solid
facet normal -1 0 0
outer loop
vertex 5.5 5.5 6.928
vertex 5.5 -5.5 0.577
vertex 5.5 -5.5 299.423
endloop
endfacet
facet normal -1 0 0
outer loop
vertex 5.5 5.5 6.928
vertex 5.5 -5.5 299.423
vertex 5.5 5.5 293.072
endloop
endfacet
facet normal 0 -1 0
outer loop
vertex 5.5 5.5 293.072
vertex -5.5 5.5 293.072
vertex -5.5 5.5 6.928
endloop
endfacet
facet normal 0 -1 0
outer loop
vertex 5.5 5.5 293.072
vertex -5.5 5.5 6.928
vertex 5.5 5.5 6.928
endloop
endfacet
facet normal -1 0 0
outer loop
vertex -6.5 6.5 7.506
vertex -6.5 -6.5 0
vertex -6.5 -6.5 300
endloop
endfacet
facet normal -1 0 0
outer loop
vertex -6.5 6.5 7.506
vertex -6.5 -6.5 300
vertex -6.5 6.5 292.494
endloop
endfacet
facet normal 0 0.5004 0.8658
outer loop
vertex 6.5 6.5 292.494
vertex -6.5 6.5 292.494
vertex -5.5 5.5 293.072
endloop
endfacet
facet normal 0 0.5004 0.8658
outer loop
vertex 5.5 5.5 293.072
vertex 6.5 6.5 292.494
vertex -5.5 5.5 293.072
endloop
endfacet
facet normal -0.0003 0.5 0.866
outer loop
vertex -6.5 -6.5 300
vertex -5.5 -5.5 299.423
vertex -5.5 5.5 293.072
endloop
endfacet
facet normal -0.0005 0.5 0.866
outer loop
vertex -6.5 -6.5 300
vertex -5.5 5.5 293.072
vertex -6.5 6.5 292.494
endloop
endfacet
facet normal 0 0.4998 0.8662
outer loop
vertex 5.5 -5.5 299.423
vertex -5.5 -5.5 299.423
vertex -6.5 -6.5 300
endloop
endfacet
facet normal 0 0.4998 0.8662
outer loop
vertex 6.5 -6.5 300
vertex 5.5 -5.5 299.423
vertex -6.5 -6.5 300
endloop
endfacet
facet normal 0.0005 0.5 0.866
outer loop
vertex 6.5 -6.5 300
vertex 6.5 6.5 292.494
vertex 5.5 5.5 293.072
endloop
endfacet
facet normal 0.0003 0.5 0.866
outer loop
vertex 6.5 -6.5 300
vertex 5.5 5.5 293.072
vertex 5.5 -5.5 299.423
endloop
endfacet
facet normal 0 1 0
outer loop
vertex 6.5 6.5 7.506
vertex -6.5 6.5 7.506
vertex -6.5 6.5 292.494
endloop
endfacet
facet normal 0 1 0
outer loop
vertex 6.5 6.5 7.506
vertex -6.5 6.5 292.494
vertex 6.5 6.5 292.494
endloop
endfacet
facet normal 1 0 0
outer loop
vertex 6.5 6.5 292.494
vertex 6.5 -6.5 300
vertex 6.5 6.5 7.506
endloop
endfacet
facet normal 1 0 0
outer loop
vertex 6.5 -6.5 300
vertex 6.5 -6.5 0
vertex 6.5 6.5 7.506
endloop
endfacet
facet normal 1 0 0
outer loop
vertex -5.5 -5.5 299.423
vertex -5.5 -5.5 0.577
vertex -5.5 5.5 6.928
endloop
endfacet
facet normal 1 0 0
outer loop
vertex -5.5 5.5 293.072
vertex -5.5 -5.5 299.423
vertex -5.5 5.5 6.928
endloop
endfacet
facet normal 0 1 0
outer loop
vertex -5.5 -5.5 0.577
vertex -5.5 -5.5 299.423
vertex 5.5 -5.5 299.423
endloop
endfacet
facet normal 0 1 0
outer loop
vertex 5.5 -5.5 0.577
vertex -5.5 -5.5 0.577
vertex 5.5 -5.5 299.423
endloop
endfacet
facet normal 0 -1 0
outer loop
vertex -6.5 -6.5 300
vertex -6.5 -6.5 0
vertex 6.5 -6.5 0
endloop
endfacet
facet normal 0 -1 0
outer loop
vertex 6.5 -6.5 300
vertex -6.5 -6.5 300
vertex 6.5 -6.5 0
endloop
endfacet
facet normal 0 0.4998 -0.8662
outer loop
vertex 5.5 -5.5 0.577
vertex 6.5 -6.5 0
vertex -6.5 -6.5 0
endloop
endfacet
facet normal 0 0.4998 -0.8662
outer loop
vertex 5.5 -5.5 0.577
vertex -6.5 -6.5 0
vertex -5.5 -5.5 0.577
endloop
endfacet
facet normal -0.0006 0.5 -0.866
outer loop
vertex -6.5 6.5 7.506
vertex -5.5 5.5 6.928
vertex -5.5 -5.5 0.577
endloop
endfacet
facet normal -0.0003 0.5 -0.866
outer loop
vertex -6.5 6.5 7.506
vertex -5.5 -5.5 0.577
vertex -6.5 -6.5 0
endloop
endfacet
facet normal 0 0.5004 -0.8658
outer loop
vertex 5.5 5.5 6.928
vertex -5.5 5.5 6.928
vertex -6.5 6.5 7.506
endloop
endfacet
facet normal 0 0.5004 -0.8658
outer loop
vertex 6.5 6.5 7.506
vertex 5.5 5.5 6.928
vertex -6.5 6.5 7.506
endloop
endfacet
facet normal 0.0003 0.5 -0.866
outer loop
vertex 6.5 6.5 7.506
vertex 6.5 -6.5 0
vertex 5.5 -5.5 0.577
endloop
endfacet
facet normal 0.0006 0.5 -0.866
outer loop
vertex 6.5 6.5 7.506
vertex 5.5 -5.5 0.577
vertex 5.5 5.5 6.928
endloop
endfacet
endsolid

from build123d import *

# Parameters (mm, degrees)
SKETCH1_W               = 13
SKETCH1_H               = 13
SKETCH1_W_2             = 11
SKETCH1_H_2             = 11
BOSS_EXTRUDE1_DEPTH     = 300
CUT_EXTRUDE2_DEPTH      = 1
CUT_EXTRUDE2_DEPTH_BACK = 14
CUT_EXTRUDE3_DEPTH      = 1
CUT_EXTRUDE3_DEPTH_BACK = 14


with BuildPart() as part:
    # Sketch1 → Boss-Extrude1 (new body)
    with BuildSketch(Plane.XY):
        Rectangle(SKETCH1_W, SKETCH1_H)
        Rectangle(SKETCH1_W_2, SKETCH1_H_2, mode=Mode.SUBTRACT)
    extrude(amount=BOSS_EXTRUDE1_DEPTH)

    # Sketch2 → Cut-Extrude2 (cut, two sides)
    with BuildSketch(Plane(origin=(6.5, 0, 0), x_dir=(0, 0, -1), z_dir=(1, 0, 0))) as cut_extrude2_sk:
        Polygon((12.787088063, 535.263128477), (-292.494446501, 6.5), (-300, -6.5), (-605.281534564, -535.263128477), (-1662.807791518, 75.299940651), (-1044.739168891, 1145.826197605), align=None)
    extrude(amount=CUT_EXTRUDE2_DEPTH, mode=Mode.SUBTRACT)
    extrude(cut_extrude2_sk.sketch, amount=-CUT_EXTRUDE2_DEPTH_BACK, mode=Mode.SUBTRACT)

    # Sketch3 → Cut-Extrude3 (cut, two sides)
    with BuildSketch(Plane(origin=(6.5, 0, 0), x_dir=(0, 0, -1), z_dir=(1, 0, 0))) as cut_extrude3_sk:
        Polygon((305.281534564, -535.263128477), (0, -6.5), (-7.505553499, 6.5), (-312.787088063, 535.263128477), (744.739168891, 1145.826197605), (1362.807791518, 75.299940651), align=None)
    extrude(amount=CUT_EXTRUDE3_DEPTH, mode=Mode.SUBTRACT)
    extrude(cut_extrude3_sk.sketch, amount=-CUT_EXTRUDE3_DEPTH_BACK, mode=Mode.SUBTRACT)


solid = part.part
